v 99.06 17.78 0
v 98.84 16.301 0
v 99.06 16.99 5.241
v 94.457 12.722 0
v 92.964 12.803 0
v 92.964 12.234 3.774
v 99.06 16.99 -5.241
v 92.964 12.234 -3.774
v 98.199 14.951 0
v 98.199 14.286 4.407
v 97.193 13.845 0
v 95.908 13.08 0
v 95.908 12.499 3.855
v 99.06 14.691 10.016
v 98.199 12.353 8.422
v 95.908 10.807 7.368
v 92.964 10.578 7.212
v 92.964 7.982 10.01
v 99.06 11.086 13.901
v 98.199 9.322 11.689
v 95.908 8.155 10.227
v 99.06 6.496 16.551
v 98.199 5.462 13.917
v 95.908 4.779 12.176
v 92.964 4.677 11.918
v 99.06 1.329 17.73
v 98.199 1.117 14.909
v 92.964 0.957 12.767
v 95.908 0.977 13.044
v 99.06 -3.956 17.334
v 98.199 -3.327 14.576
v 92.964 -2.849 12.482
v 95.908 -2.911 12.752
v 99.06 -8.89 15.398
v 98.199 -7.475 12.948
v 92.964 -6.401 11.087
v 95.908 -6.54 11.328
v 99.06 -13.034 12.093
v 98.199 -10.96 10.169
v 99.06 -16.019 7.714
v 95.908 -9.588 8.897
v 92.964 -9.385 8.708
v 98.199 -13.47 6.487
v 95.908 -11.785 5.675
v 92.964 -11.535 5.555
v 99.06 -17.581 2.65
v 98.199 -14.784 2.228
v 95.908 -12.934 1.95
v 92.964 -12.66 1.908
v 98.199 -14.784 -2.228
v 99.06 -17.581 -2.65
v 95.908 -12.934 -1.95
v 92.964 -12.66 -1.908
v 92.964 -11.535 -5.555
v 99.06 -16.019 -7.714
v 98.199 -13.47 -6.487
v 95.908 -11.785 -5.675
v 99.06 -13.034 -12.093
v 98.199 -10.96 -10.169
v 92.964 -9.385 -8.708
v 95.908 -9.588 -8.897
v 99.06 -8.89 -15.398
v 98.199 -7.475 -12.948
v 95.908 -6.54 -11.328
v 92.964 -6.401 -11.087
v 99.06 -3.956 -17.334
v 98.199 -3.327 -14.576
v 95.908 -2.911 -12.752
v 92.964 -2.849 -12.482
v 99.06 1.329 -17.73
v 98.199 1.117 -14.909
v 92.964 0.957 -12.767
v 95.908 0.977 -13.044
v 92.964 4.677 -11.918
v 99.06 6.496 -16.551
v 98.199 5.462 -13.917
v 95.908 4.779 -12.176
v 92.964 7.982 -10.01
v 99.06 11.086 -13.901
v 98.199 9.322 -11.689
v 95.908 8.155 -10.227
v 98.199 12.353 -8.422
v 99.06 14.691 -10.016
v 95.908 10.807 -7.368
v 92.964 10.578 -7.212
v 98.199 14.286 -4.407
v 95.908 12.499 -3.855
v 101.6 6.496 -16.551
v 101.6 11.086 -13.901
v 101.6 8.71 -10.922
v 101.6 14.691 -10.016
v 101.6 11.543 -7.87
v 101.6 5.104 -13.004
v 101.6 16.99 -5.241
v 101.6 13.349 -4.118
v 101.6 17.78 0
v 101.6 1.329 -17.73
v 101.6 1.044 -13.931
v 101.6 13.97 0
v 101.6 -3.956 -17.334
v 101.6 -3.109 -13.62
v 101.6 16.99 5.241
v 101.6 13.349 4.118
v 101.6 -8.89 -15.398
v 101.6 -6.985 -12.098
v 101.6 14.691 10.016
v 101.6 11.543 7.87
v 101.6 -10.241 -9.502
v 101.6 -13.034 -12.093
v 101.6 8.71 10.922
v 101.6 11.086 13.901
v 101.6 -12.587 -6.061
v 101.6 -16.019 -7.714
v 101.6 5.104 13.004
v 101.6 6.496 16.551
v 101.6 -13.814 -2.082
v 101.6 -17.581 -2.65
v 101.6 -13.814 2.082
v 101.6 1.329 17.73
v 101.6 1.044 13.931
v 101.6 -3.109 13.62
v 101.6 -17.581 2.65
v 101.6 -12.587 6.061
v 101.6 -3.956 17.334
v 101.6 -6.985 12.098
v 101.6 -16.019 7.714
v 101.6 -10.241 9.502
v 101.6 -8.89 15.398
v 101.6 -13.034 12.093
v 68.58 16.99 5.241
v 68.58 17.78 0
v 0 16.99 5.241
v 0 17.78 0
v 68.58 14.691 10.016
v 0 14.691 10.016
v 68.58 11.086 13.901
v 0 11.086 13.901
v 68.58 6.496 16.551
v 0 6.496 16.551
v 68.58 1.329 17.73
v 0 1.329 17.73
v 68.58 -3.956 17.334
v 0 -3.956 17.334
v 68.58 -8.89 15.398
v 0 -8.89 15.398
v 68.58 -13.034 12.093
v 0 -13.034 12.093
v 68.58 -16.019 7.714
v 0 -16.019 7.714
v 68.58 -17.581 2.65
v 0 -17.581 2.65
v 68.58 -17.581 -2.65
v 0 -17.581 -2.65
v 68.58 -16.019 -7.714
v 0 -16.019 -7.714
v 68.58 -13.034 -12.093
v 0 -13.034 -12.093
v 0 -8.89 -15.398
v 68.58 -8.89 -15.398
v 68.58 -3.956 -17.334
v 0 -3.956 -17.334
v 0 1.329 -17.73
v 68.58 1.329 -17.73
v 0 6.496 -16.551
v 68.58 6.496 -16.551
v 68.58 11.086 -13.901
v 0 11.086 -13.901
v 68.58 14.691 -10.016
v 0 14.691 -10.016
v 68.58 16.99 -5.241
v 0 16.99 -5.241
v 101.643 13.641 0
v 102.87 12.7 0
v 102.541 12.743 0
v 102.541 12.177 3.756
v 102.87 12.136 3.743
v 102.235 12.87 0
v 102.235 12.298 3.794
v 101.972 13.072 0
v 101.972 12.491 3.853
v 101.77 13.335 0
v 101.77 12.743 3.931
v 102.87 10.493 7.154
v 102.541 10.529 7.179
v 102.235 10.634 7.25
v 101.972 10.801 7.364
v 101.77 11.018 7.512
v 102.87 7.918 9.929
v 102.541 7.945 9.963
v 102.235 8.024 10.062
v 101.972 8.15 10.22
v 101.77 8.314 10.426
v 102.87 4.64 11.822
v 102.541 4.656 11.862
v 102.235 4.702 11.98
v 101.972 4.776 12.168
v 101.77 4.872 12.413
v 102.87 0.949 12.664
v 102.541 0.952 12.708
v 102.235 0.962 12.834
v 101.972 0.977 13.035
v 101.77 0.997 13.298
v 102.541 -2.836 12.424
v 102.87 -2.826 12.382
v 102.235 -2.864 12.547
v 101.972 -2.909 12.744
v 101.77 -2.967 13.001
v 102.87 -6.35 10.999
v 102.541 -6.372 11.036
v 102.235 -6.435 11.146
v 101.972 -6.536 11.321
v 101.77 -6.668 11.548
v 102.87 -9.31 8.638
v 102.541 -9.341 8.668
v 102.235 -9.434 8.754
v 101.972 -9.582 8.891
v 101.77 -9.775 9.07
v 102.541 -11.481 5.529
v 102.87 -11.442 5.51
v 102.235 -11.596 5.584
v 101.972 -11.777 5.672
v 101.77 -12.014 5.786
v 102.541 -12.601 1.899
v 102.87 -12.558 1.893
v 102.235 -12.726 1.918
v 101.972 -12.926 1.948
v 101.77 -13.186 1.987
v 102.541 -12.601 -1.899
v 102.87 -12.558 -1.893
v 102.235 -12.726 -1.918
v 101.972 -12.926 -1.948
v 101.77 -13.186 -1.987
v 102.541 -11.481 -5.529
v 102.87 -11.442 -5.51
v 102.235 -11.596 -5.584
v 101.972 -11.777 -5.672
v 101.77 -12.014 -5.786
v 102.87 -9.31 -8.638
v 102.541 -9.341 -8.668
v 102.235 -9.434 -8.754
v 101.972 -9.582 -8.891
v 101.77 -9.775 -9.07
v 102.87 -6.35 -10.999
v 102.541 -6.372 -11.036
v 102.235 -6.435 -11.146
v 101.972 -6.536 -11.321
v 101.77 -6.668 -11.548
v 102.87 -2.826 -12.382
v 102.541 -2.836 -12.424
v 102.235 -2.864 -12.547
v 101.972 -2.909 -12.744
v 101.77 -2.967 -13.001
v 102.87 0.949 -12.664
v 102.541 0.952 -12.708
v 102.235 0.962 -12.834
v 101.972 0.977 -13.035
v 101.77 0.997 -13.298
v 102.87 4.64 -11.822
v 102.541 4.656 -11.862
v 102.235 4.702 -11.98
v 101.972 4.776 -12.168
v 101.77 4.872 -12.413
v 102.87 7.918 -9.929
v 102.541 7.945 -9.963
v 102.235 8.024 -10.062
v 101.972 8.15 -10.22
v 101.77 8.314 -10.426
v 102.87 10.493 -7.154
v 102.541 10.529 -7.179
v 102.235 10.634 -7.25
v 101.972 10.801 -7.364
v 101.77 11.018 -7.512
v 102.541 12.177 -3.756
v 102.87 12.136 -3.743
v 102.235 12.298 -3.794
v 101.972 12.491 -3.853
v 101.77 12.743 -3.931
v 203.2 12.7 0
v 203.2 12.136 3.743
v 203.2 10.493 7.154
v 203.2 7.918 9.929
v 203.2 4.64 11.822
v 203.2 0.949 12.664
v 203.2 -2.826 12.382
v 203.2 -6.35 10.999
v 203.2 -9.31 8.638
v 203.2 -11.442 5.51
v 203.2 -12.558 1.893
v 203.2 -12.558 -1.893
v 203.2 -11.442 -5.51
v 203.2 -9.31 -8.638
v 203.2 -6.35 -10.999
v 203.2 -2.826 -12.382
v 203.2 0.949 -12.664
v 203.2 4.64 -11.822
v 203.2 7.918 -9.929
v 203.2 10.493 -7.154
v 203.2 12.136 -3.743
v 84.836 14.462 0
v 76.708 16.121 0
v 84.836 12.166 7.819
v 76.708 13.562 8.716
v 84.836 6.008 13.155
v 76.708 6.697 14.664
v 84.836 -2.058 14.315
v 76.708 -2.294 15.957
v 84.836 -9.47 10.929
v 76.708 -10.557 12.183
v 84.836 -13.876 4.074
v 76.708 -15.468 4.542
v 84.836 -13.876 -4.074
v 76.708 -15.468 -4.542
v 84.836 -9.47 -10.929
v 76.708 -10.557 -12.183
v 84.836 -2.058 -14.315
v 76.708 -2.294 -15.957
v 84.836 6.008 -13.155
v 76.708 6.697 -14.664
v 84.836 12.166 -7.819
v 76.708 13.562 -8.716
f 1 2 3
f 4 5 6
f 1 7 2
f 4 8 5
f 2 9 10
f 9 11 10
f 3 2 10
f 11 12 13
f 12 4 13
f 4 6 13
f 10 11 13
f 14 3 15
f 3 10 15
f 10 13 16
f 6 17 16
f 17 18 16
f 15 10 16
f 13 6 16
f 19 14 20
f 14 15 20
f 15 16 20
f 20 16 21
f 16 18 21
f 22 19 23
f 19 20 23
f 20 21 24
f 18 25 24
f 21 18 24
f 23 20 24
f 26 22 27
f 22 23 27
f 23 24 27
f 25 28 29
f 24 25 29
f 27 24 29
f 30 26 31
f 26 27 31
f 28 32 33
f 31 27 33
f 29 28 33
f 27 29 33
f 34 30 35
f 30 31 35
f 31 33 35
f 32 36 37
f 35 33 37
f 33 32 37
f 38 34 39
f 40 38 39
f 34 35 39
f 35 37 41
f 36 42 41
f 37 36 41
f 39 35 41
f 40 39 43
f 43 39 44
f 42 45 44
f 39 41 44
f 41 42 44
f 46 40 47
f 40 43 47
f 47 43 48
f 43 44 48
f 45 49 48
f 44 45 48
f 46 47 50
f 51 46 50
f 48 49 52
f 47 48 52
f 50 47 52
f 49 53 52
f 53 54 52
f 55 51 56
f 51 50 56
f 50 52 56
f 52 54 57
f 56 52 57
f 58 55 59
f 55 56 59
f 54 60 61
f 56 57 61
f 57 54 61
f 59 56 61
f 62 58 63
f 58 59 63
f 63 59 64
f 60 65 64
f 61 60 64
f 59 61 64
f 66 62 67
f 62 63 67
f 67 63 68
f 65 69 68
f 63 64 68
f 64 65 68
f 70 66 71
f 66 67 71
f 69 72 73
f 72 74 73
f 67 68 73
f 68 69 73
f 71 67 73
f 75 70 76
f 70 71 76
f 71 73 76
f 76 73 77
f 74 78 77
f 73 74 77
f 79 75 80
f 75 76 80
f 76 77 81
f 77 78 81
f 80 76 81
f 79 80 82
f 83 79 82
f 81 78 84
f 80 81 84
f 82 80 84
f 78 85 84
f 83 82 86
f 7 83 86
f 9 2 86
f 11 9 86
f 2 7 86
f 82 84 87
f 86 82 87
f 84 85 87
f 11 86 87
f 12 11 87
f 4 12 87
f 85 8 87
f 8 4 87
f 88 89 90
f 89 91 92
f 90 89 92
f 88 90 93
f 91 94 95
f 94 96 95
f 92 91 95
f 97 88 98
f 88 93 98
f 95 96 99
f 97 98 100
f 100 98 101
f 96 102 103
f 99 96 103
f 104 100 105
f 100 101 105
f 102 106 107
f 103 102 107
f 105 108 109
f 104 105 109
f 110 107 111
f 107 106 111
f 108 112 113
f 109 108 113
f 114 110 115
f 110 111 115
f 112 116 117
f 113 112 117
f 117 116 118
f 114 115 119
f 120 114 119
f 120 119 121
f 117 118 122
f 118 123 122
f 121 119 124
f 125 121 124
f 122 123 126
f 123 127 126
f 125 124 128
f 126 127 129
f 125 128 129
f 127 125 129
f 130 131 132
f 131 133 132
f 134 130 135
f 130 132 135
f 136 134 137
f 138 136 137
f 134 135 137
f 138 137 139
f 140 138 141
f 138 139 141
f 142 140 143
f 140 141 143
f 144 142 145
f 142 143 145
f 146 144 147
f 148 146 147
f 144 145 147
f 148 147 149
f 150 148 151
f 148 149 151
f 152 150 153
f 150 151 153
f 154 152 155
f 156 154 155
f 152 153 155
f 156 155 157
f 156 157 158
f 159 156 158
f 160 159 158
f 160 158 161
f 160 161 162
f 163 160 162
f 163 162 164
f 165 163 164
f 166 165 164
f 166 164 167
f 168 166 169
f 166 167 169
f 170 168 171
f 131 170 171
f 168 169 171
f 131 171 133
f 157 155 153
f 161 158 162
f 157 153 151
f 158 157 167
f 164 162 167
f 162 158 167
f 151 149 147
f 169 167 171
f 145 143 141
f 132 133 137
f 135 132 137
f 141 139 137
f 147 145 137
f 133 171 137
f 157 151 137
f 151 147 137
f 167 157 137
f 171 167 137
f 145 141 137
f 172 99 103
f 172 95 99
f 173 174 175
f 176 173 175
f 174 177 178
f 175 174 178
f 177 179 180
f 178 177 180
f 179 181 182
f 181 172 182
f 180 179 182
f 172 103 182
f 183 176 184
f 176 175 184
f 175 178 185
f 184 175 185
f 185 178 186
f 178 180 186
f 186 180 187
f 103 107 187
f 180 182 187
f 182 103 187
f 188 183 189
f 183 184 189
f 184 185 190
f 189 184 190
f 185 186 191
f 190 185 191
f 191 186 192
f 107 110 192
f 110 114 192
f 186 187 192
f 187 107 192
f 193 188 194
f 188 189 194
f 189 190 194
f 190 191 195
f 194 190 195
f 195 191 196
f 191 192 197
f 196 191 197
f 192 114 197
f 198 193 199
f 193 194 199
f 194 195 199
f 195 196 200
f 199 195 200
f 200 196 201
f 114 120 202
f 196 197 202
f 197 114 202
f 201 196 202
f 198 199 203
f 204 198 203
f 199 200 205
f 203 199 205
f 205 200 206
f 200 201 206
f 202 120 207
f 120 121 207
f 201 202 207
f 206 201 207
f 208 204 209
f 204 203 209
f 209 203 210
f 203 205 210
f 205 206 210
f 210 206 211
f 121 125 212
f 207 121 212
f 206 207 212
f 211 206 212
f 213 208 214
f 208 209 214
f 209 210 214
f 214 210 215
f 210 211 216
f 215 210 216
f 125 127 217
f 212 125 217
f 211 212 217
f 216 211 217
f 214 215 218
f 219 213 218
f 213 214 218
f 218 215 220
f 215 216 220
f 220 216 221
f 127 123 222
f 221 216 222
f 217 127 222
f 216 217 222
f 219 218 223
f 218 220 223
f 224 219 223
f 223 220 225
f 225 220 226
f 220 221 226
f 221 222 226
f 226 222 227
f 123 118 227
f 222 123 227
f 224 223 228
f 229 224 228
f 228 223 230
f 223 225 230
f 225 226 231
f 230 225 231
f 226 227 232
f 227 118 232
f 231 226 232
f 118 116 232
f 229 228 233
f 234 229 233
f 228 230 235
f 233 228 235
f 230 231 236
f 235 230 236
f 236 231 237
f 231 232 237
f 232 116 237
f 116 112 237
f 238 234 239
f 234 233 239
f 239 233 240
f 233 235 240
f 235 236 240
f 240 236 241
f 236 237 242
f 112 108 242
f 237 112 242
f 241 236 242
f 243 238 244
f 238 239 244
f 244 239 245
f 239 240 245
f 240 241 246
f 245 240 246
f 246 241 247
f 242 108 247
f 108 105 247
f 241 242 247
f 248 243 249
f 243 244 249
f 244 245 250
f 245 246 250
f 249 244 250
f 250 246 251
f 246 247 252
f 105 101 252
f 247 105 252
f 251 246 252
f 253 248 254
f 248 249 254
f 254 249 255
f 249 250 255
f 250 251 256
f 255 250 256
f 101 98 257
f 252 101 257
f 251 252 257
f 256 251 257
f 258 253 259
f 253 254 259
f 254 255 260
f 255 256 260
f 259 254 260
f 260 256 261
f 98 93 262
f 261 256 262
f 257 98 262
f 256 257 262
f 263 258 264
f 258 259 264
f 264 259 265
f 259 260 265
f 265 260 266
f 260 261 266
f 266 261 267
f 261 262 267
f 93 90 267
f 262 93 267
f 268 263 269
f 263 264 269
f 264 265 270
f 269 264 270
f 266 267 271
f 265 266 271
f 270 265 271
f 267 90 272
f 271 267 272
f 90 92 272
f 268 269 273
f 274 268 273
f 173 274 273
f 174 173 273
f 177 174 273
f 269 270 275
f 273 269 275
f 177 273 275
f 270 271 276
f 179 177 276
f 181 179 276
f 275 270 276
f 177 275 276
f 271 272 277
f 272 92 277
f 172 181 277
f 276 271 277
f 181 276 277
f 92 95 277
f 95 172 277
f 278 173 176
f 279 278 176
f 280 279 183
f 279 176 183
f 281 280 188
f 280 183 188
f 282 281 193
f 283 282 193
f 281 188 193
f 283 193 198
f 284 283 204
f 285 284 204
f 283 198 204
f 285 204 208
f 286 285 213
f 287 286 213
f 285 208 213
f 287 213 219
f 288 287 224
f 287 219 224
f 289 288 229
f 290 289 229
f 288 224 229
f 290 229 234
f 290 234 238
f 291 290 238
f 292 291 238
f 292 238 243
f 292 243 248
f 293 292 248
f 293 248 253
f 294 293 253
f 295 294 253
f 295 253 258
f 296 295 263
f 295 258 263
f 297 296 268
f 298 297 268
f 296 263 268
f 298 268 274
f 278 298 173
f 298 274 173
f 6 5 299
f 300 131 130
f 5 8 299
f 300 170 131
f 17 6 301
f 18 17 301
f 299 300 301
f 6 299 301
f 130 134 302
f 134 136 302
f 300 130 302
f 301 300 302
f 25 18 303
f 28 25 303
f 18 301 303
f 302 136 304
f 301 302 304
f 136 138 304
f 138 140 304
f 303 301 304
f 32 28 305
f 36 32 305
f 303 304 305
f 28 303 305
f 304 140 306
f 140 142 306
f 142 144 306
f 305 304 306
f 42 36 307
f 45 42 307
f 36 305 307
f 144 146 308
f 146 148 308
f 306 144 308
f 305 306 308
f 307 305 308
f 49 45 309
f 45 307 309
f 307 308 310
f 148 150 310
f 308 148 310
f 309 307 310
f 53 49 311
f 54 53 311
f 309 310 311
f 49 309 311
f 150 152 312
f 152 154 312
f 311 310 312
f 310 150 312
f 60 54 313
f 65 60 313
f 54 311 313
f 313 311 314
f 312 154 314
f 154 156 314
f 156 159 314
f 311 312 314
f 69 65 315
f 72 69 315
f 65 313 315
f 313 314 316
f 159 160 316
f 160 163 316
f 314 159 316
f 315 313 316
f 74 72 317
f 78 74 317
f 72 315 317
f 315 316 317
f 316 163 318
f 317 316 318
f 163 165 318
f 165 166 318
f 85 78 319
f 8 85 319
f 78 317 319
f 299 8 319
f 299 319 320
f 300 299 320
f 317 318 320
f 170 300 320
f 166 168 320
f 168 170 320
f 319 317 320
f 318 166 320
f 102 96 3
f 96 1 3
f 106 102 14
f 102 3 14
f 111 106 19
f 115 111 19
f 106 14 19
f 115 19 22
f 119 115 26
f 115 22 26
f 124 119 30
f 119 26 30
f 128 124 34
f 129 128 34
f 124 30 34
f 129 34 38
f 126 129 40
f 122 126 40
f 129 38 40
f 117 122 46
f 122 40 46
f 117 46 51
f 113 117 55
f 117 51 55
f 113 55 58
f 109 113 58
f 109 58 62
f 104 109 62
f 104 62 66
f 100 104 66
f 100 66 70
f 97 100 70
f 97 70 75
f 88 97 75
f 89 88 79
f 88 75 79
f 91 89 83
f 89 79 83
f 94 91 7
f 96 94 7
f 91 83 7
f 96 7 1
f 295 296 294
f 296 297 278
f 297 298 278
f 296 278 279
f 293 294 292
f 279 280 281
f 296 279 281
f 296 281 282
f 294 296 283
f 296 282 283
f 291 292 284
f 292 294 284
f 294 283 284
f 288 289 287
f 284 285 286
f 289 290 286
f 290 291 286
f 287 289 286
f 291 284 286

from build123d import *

# Parameters (mm, degrees)
FILLET1_R = 1.27


with BuildPart() as part:
    # Sketch1 → Revolve1 (revolve)
    with BuildSketch(Plane.XY):
        with BuildLine():
            Line((0, 17.78), (0, 0))
            Line((0, 0), (203.2, 0))
            Line((203.2, 0), (203.2, 12.7))
            Line((203.2, 12.7), (101.6, 12.7))
            Line((101.6, 12.7), (101.6, 17.78))
            Line((101.6, 17.78), (99.06, 17.78))
            ThreePointArc((99.06, 17.78), (97.192874103, 13.84504892), (92.964, 12.802636843))
            Line((92.964, 12.802636843), (68.58, 17.78))
            Line((68.58, 17.78), (0, 17.78))
        make_face()
    revolve(axis=Axis((-70.891441255, 0, 0), (1, 0, 0)))

    # Fillet1
    fillet1_edges = [part.edges().sort_by_distance(p)[0] for p in [
        (101.6, -12.7, 0),
    ]]
    fillet(fillet1_edges, radius=FILLET1_R)


solid = part.part
